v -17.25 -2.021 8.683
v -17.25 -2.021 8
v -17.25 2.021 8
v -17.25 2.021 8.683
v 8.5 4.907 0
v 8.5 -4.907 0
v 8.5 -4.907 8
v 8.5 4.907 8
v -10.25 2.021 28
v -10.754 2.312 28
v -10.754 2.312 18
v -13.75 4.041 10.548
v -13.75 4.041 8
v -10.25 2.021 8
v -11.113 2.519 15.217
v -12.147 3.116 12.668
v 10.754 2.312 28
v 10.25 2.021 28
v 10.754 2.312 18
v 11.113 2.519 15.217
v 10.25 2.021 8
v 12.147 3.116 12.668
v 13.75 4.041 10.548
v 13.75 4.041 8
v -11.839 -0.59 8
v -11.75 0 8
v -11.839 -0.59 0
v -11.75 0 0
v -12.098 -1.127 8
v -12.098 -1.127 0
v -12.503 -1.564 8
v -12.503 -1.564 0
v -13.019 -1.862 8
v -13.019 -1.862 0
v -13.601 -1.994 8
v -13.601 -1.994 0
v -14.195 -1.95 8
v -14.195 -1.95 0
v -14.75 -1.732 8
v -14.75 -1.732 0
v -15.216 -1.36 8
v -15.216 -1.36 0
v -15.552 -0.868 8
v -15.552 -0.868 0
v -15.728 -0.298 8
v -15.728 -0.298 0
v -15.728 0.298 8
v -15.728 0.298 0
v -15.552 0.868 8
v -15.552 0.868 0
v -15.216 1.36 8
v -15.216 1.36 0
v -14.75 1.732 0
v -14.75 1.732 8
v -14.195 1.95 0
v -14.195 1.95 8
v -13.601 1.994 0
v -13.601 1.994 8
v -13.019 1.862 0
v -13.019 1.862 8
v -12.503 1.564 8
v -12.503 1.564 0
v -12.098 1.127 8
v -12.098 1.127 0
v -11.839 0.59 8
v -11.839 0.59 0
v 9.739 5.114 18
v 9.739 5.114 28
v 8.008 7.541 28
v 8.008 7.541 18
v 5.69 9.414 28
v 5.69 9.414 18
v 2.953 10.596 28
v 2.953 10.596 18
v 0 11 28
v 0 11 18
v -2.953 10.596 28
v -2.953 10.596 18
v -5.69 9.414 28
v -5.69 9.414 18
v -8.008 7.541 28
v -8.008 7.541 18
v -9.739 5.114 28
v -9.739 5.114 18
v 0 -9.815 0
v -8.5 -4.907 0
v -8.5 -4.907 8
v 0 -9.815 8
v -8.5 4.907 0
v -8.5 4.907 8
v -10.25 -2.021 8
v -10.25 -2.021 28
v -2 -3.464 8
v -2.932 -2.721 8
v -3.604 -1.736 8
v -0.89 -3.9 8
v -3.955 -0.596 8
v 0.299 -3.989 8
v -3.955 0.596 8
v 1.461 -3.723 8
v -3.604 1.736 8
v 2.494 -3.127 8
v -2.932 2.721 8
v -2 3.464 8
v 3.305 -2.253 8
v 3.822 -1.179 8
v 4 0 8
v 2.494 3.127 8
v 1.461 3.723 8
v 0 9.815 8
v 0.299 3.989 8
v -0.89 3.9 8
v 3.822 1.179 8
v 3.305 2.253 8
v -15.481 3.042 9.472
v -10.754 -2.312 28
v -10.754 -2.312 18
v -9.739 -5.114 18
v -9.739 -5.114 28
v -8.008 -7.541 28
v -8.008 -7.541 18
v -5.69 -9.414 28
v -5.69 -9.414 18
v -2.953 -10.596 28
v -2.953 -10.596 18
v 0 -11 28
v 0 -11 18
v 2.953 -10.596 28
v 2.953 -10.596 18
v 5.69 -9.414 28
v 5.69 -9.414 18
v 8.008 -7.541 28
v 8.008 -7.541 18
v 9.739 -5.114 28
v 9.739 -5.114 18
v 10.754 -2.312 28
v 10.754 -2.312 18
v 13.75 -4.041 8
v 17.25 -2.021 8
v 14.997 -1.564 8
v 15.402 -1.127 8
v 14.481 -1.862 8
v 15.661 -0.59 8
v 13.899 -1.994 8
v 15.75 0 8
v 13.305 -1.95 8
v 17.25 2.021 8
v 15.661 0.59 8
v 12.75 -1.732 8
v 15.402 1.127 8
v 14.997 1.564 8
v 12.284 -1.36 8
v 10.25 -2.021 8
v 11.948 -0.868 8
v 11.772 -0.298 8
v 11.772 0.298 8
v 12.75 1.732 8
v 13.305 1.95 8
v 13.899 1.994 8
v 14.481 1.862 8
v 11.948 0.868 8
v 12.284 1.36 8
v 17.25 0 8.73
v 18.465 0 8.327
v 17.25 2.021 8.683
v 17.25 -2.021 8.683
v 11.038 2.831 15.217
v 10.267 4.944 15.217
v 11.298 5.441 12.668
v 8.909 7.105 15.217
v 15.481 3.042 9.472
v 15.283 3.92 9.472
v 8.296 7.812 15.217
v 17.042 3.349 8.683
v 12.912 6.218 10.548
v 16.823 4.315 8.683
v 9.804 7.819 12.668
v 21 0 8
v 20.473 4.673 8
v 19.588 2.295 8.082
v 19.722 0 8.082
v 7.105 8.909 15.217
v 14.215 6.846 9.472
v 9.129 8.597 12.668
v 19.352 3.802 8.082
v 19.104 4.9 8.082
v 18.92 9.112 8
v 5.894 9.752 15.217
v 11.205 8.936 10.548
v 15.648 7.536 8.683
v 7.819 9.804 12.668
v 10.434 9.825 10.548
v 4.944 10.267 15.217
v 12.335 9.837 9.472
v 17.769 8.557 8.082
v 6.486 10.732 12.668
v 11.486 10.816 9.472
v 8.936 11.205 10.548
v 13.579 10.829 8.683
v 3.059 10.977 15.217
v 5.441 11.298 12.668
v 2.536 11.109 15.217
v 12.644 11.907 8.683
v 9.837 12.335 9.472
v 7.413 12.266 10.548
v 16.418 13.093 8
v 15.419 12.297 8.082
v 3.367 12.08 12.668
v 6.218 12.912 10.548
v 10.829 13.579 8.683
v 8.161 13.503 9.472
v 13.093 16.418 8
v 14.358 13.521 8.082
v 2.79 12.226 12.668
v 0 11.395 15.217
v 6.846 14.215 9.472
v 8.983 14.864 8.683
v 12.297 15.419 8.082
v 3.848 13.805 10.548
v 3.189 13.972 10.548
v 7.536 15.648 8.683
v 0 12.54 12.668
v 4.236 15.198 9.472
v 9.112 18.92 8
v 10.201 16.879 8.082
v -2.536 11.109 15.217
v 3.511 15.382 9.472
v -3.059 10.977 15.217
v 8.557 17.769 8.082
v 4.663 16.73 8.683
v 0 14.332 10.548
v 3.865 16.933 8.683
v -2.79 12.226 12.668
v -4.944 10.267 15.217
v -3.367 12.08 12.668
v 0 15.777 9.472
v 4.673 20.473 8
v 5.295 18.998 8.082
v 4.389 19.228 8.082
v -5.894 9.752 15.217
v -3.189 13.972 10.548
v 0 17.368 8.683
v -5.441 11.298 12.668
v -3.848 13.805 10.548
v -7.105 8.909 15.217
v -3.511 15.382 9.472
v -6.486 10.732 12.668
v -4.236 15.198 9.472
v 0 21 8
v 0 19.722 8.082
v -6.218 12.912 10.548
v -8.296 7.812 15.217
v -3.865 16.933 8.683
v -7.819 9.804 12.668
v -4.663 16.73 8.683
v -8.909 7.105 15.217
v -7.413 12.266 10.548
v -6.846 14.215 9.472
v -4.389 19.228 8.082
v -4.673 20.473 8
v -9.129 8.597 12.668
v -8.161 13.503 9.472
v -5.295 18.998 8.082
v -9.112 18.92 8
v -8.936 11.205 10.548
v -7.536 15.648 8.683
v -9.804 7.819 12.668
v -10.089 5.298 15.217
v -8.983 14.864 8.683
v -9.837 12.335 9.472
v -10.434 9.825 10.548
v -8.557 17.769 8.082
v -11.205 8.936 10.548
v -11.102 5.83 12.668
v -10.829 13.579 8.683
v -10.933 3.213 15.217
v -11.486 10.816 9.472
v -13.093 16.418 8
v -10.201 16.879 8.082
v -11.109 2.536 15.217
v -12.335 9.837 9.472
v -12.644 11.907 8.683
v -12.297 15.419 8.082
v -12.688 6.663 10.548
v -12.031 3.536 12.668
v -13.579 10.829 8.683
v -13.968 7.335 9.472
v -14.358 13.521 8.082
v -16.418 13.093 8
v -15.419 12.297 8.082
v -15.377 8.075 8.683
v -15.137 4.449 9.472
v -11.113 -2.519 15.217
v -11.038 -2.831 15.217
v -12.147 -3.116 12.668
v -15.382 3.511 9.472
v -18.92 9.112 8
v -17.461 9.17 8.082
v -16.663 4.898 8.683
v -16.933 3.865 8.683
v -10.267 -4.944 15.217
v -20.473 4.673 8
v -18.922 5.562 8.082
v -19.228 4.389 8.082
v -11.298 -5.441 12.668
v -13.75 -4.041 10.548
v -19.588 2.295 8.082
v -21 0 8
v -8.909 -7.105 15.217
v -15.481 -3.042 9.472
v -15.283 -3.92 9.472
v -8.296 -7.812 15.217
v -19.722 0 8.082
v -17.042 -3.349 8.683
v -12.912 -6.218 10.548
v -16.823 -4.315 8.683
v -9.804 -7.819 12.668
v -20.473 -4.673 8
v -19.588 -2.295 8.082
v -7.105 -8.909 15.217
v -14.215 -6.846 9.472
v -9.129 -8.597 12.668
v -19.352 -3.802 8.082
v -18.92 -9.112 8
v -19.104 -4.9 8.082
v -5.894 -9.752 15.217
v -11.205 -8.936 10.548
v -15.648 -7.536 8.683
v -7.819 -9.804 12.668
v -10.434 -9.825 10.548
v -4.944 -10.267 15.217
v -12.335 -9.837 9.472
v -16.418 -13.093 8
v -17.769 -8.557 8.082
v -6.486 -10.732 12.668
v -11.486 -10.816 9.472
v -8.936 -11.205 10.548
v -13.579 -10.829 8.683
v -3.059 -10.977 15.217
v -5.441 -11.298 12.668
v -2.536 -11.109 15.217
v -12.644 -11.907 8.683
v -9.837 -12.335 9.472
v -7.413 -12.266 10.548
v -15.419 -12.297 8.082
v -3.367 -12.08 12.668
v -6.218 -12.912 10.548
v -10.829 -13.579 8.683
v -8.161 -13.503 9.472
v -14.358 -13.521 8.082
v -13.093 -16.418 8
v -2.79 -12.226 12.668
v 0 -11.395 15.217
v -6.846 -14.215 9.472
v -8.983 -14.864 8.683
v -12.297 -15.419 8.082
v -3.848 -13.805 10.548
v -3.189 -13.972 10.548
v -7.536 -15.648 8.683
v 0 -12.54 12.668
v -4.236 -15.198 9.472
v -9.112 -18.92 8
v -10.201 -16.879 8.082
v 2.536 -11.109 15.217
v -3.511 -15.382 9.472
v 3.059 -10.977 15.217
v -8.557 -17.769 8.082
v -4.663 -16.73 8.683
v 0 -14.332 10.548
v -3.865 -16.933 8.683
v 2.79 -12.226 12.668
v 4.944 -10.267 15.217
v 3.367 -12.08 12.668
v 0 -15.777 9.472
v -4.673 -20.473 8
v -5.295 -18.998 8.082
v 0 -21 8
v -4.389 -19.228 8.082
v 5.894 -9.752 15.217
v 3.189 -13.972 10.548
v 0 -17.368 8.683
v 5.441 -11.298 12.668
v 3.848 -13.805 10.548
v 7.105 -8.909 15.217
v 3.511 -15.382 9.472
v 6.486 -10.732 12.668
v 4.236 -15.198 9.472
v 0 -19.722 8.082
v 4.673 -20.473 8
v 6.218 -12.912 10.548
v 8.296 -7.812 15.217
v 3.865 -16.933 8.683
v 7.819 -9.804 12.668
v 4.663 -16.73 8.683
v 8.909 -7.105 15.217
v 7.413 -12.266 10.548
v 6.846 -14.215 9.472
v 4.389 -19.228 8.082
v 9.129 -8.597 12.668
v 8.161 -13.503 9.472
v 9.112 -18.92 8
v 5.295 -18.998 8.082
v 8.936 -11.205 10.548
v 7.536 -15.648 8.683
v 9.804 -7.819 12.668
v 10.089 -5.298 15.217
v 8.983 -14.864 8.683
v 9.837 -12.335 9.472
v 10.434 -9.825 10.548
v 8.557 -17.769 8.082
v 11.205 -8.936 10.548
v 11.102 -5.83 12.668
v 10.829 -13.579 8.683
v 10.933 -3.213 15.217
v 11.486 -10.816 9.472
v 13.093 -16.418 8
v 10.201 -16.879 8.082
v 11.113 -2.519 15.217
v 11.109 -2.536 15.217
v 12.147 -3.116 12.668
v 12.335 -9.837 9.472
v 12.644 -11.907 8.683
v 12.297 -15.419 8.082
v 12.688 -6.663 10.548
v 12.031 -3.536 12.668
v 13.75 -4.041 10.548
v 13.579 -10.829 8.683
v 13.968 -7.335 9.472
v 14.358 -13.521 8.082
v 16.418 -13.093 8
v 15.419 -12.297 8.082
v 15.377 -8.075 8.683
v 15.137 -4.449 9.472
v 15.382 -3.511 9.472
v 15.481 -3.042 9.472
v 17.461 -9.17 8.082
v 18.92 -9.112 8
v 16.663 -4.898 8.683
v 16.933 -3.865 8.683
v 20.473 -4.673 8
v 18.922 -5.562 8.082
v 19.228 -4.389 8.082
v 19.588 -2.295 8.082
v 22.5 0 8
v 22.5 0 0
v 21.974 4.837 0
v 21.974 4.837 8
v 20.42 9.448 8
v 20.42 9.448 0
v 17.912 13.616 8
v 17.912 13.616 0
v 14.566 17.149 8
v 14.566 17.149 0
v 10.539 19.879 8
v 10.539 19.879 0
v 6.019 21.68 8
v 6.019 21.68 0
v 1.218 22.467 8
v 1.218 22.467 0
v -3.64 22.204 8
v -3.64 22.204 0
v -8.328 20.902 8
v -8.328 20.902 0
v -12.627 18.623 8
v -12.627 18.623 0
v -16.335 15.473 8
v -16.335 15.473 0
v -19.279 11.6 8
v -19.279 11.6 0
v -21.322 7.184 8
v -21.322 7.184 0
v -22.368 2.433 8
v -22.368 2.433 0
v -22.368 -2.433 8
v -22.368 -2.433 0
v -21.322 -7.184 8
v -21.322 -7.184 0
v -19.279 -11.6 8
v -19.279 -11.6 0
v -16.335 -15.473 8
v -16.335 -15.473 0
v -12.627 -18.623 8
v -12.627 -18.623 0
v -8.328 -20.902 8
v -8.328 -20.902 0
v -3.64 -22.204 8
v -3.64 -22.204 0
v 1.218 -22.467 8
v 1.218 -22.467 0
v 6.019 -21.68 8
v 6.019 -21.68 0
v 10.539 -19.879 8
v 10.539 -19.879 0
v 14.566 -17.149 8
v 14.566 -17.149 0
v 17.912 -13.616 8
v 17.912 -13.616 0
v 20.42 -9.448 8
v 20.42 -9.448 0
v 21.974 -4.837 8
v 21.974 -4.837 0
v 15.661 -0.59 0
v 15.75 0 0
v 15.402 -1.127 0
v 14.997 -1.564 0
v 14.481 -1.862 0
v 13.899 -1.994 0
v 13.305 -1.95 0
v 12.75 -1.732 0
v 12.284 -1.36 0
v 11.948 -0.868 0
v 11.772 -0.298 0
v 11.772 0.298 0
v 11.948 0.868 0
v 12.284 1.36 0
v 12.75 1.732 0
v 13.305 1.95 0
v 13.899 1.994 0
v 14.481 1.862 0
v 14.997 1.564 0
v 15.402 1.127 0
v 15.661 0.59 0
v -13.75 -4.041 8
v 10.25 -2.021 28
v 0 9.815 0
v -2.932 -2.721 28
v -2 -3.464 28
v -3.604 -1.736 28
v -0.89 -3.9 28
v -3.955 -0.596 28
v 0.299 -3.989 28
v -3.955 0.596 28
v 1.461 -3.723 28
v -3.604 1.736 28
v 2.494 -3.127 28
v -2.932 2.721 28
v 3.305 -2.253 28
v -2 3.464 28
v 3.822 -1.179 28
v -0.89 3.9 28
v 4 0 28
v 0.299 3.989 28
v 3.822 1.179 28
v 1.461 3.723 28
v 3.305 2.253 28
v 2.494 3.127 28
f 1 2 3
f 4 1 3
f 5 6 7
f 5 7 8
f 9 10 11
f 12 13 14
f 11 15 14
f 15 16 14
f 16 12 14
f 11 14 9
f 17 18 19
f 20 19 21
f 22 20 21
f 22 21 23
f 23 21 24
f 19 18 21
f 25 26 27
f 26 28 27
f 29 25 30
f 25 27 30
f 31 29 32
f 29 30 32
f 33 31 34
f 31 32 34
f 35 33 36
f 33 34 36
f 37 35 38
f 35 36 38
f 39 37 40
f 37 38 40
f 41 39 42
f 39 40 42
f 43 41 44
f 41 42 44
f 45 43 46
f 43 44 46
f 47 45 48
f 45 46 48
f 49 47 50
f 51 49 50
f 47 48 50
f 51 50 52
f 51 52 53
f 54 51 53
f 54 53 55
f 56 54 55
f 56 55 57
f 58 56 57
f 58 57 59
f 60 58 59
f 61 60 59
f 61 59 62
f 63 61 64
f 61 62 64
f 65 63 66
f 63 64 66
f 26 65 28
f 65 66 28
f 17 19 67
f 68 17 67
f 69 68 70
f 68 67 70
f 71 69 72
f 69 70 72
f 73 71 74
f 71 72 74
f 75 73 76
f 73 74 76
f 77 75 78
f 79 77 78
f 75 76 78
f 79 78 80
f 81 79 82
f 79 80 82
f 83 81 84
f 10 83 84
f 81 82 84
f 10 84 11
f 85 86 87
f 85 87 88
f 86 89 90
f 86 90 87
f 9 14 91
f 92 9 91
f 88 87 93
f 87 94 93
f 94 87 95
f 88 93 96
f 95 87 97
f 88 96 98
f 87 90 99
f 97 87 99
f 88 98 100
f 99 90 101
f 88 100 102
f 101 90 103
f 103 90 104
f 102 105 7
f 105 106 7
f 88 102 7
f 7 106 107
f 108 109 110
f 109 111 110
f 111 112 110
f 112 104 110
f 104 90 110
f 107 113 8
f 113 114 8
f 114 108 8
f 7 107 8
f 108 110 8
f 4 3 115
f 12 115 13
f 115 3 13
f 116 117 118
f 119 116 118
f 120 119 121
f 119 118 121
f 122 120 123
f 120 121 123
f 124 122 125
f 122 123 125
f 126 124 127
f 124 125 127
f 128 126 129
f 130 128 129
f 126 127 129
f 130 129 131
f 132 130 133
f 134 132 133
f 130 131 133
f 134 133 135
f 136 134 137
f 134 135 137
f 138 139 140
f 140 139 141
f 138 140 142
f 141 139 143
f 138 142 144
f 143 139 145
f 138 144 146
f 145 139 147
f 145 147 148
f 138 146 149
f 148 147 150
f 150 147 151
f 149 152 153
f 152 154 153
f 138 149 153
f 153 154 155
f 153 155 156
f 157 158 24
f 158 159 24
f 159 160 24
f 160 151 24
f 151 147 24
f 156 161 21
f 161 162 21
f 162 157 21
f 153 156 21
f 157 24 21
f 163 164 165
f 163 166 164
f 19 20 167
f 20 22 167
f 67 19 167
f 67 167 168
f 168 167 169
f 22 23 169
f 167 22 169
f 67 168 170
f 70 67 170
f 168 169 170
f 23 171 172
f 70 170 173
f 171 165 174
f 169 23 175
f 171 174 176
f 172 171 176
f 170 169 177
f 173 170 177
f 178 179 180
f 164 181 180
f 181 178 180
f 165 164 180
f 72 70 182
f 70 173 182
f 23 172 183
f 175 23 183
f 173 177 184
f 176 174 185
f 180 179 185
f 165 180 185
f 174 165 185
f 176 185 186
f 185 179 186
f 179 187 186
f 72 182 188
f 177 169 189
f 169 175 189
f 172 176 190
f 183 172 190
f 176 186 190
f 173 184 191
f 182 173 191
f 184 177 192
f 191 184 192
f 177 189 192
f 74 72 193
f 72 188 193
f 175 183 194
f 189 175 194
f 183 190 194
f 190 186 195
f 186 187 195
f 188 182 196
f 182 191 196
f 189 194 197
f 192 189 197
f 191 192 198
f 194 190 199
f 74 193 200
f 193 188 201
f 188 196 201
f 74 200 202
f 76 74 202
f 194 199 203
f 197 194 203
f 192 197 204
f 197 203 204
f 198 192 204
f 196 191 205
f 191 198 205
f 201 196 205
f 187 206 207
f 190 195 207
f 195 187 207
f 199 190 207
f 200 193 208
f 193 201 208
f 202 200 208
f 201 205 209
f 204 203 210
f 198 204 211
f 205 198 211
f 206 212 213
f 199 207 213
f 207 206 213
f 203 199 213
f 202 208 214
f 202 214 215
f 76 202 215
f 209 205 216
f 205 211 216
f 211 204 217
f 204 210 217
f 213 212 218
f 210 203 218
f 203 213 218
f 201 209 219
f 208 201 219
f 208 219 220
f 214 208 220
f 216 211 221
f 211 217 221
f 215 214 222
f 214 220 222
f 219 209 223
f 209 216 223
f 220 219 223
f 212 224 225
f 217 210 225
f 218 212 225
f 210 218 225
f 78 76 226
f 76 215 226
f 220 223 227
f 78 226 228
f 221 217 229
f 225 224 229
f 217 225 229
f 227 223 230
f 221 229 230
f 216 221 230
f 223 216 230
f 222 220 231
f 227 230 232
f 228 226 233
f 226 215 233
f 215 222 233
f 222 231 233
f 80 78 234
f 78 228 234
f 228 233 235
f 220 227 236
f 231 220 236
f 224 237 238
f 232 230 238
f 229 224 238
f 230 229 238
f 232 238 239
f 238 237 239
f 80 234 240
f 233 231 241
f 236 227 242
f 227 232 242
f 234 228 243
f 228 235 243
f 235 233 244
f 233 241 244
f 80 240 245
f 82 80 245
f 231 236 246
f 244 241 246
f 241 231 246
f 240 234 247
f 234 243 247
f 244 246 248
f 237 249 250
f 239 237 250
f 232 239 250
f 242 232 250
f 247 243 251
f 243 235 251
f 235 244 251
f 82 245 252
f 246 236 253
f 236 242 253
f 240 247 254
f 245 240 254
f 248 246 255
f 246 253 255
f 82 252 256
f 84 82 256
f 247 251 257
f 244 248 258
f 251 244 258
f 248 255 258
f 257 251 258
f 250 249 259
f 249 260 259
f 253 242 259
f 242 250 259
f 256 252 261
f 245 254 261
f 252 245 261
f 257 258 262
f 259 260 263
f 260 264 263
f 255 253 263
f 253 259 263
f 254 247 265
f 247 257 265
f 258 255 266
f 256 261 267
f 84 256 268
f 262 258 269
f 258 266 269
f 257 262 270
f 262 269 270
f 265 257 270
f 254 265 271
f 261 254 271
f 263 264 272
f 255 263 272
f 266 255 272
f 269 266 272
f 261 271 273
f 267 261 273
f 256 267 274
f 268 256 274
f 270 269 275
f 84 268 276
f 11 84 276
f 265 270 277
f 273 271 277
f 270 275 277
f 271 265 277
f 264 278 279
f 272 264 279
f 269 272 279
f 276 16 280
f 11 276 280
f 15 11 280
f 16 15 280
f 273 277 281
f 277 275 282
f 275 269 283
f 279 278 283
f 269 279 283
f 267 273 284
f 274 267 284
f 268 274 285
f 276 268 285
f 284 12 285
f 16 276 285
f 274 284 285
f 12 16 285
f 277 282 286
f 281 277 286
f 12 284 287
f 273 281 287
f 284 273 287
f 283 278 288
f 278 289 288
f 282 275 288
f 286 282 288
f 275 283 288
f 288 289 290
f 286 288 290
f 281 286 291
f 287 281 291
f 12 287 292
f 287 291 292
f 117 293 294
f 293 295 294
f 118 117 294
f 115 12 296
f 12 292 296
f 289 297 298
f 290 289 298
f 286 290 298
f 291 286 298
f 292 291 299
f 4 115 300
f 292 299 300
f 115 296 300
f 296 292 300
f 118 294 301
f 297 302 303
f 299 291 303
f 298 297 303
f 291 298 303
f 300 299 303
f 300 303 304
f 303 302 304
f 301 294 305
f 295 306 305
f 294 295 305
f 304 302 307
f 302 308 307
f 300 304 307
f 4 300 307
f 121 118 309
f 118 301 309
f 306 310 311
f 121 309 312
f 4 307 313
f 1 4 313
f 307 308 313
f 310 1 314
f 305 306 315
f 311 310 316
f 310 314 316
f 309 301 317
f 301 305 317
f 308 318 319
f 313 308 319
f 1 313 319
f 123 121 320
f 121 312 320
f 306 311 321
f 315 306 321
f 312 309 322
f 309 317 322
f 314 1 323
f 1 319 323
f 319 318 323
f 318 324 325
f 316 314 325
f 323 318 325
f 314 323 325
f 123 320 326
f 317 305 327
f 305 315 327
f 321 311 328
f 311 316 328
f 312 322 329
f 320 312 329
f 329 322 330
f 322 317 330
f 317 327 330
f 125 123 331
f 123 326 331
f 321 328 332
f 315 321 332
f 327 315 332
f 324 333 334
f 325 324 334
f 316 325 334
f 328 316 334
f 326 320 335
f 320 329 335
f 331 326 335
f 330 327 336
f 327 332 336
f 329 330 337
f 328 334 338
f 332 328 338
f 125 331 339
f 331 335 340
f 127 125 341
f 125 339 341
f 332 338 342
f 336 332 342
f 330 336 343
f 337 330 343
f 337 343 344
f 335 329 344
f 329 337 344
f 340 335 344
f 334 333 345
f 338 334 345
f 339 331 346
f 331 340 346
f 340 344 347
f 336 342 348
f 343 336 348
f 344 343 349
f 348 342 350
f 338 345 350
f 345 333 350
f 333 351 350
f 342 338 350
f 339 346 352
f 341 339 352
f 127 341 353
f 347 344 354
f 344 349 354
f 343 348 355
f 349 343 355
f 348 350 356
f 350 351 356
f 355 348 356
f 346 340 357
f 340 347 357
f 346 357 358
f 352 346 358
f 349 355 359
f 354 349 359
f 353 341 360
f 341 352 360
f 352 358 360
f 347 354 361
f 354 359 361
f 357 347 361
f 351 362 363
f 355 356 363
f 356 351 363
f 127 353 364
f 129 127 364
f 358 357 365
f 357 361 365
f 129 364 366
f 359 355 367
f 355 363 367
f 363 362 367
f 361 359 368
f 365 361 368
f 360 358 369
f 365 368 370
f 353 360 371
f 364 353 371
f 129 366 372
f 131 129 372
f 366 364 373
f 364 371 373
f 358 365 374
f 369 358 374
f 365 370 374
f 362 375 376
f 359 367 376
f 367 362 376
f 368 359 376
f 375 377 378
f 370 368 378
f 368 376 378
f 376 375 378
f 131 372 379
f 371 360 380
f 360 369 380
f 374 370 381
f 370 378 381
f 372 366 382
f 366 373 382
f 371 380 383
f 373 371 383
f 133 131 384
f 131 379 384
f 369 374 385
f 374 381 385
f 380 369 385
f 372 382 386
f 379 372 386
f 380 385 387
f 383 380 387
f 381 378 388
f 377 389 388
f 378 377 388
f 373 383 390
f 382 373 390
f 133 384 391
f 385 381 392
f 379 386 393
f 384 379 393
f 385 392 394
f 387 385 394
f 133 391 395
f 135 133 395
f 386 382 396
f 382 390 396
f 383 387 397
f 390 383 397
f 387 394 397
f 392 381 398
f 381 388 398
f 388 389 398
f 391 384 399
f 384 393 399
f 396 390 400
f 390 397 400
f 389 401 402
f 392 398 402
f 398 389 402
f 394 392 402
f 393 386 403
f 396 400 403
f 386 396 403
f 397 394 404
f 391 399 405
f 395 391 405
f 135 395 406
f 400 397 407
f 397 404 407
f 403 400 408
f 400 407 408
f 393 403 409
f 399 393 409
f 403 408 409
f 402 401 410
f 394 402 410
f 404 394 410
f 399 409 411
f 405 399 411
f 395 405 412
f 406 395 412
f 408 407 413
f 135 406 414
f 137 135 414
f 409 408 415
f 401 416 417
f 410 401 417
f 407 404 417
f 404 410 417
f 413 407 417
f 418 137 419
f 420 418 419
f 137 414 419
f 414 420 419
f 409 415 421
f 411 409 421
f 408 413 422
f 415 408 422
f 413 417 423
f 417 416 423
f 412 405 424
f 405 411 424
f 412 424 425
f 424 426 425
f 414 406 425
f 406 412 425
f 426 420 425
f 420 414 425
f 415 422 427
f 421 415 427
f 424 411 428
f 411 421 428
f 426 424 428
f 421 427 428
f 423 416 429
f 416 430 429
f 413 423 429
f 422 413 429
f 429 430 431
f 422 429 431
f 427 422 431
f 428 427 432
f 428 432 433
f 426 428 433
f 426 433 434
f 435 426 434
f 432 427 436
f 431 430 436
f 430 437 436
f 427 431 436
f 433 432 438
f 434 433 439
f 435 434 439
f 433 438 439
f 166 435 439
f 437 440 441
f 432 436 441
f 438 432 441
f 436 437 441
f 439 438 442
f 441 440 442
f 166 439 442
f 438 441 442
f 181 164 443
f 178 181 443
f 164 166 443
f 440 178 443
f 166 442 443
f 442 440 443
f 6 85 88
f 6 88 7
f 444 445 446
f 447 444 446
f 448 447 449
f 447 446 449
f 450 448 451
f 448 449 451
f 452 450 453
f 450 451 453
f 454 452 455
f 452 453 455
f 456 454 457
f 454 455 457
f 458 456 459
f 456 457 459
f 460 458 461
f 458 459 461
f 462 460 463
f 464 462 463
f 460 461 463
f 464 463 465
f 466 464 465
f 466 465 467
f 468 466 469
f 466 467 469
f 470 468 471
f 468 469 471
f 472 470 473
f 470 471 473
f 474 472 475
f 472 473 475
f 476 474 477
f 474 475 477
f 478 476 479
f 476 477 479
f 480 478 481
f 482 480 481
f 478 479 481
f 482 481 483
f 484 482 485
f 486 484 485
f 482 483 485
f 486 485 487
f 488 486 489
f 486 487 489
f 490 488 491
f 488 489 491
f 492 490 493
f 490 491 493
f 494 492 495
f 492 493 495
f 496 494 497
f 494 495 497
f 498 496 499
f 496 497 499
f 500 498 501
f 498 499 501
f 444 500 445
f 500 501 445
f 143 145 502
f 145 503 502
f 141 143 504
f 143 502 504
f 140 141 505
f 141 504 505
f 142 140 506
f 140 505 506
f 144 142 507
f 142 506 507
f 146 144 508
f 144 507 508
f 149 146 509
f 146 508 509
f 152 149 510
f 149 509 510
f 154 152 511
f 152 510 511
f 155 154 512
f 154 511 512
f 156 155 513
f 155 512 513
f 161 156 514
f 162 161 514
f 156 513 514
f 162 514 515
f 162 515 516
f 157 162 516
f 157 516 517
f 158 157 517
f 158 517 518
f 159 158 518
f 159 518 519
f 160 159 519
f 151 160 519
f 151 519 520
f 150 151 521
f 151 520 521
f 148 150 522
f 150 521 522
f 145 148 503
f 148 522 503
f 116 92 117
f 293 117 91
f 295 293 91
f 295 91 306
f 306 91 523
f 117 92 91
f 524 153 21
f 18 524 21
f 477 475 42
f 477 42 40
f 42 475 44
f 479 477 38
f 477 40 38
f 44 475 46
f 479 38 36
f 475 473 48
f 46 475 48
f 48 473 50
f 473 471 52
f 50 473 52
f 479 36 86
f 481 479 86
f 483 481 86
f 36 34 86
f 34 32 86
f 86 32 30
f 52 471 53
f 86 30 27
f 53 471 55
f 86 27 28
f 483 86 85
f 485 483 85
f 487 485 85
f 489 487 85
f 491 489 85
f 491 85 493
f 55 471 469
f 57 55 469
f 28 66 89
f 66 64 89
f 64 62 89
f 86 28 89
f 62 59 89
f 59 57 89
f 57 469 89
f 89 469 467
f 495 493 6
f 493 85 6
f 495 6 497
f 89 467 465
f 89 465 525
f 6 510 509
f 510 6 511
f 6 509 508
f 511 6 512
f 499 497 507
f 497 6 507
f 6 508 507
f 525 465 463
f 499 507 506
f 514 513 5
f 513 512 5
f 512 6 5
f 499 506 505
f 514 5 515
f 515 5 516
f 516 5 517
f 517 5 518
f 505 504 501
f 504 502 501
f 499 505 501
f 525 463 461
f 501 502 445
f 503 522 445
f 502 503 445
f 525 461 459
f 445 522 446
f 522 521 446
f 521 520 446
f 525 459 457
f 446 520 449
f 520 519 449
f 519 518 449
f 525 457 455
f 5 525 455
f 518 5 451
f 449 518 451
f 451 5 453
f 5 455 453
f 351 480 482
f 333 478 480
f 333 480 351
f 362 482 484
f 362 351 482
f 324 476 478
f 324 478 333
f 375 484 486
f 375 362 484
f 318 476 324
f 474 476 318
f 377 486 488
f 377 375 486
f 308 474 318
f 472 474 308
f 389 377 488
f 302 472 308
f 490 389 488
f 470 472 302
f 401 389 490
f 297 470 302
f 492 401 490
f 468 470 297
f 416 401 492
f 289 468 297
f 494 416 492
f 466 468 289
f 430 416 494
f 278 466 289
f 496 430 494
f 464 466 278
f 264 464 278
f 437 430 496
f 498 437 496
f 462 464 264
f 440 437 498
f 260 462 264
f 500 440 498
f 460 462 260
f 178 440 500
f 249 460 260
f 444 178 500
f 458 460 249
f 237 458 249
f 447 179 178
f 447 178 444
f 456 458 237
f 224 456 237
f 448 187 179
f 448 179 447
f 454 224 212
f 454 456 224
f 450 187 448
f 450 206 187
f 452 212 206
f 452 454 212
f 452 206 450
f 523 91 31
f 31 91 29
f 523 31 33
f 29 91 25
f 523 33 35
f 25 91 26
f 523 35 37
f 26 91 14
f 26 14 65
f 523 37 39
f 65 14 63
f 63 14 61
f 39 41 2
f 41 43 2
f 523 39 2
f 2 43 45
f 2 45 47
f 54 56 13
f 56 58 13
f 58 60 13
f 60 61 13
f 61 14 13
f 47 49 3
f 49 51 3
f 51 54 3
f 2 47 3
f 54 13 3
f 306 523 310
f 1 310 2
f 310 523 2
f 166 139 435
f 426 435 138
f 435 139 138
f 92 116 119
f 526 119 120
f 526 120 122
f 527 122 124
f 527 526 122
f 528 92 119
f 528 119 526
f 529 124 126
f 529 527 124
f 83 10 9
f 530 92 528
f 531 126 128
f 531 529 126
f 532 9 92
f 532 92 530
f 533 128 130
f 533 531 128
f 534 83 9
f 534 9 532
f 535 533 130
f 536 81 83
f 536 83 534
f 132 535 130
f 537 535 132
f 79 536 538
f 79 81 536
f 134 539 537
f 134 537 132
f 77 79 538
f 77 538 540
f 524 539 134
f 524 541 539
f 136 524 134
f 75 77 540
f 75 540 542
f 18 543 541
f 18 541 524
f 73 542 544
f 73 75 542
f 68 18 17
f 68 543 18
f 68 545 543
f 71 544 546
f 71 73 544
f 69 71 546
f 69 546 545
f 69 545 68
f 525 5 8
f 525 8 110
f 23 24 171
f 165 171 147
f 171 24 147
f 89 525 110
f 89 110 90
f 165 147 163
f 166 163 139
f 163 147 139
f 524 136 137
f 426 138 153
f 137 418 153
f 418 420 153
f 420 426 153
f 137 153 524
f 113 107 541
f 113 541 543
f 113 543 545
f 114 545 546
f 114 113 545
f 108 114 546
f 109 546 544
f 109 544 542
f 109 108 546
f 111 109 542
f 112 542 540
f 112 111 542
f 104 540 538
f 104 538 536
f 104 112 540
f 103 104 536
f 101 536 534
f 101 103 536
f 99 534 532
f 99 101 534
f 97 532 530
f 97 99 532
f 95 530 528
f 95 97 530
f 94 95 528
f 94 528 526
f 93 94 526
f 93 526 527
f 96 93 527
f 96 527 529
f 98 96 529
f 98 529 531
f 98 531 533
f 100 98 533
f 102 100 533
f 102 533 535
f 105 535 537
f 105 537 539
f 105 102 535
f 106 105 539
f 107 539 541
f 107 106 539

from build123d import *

# Parameters (mm, degrees)
SKETCH1_R           = 22.5
SKETCH1_R_2         = 2
BOSS_EXTRUDE1_DEPTH = 8
SKETCH2_R           = 11
SKETCH2_R_2         = 4
BOSS_EXTRUDE2_DEPTH = 20
FILLET1_R           = 10
CUT_EXTRUDE1_START  = -8
CUT_EXTRUDE1_DEPTH  = 35.385138905


with BuildPart() as part:
    # Sketch1 → Boss-Extrude1 (new body)
    with BuildSketch(Plane.XY):
        Circle(SKETCH1_R)
        with Locations((-13.75, 0)):
            Circle(SKETCH1_R_2, mode=Mode.SUBTRACT)
        with Locations((13.75, 0)):
            Circle(SKETCH1_R_2, mode=Mode.SUBTRACT)
        Polygon((0, 9.814954576), (-8.5, 4.907477288), (-8.5, -4.907477288), (0, -9.814954576), (8.5, -4.907477288), (8.5, 4.907477288), align=None, mode=Mode.SUBTRACT)
    extrude(amount=BOSS_EXTRUDE1_DEPTH)

    # Sketch2 → Boss-Extrude2 (add)
    with BuildSketch(Plane.XY.offset(8)):
        Circle(SKETCH2_R)
        Circle(SKETCH2_R_2, mode=Mode.SUBTRACT)
    extrude(amount=BOSS_EXTRUDE2_DEPTH)

    # Fillet1
    # the kernel refuses this fillet: 10 mm, written as the material it adds along each edge
    with BuildSketch(Plane(origin=(0, 0, 8), x_dir=(1, 0, 0), z_dir=(0, -1, 0))) as fillet1_piece_1_section:
        with BuildLine():
            CenterArc((11 + FILLET1_R, FILLET1_R), FILLET1_R, 180, 90)
            Line((11, FILLET1_R), (11, 0))
            Line((11, 0), (11 + FILLET1_R, 0))
        make_face()
    fillet1_piece_1 = revolve(axis=Axis((0, 0, 8), (0, 0, 1)), mode=Mode.PRIVATE)
    fillet1_piece_1 = fillet1_piece_1 - Plane(origin=(-13.75, 0, 8.218261163), x_dir=(1, 0, 0), z_dir=(0, 0, -1)) * Cylinder(2, 84, mode=Mode.PRIVATE)
    fillet1_piece_1 = fillet1_piece_1 - Plane(origin=(13.75, 0, 8.218261163), x_dir=(1, 0, 0), z_dir=(0, 0, -1)) * Cylinder(2, 84, mode=Mode.PRIVATE)
    add(fillet1_piece_1)

    # Sketch3 → Cut-Extrude1 (cut, through all)
    with BuildSketch(Plane(origin=(0, 0, 0), x_dir=(-1, 0, 0), z_dir=(0, 0, -1)).offset(CUT_EXTRUDE1_START)):
        Polygon((-13.75, 4.041451884), (-17.25, 2.020725942), (-17.25, -2.020725942), (-13.75, -4.041451884), (-10.25, -2.020725942), (-10.25, 2.020725942), align=None)
        Polygon((13.75, 4.041451884), (10.25, 2.020725942), (10.25, -2.020725942), (13.75, -4.041451884), (17.25, -2.020725942), (17.25, 2.020725942), align=None)
    extrude(amount=-CUT_EXTRUDE1_DEPTH, mode=Mode.SUBTRACT)


solid = part.part
